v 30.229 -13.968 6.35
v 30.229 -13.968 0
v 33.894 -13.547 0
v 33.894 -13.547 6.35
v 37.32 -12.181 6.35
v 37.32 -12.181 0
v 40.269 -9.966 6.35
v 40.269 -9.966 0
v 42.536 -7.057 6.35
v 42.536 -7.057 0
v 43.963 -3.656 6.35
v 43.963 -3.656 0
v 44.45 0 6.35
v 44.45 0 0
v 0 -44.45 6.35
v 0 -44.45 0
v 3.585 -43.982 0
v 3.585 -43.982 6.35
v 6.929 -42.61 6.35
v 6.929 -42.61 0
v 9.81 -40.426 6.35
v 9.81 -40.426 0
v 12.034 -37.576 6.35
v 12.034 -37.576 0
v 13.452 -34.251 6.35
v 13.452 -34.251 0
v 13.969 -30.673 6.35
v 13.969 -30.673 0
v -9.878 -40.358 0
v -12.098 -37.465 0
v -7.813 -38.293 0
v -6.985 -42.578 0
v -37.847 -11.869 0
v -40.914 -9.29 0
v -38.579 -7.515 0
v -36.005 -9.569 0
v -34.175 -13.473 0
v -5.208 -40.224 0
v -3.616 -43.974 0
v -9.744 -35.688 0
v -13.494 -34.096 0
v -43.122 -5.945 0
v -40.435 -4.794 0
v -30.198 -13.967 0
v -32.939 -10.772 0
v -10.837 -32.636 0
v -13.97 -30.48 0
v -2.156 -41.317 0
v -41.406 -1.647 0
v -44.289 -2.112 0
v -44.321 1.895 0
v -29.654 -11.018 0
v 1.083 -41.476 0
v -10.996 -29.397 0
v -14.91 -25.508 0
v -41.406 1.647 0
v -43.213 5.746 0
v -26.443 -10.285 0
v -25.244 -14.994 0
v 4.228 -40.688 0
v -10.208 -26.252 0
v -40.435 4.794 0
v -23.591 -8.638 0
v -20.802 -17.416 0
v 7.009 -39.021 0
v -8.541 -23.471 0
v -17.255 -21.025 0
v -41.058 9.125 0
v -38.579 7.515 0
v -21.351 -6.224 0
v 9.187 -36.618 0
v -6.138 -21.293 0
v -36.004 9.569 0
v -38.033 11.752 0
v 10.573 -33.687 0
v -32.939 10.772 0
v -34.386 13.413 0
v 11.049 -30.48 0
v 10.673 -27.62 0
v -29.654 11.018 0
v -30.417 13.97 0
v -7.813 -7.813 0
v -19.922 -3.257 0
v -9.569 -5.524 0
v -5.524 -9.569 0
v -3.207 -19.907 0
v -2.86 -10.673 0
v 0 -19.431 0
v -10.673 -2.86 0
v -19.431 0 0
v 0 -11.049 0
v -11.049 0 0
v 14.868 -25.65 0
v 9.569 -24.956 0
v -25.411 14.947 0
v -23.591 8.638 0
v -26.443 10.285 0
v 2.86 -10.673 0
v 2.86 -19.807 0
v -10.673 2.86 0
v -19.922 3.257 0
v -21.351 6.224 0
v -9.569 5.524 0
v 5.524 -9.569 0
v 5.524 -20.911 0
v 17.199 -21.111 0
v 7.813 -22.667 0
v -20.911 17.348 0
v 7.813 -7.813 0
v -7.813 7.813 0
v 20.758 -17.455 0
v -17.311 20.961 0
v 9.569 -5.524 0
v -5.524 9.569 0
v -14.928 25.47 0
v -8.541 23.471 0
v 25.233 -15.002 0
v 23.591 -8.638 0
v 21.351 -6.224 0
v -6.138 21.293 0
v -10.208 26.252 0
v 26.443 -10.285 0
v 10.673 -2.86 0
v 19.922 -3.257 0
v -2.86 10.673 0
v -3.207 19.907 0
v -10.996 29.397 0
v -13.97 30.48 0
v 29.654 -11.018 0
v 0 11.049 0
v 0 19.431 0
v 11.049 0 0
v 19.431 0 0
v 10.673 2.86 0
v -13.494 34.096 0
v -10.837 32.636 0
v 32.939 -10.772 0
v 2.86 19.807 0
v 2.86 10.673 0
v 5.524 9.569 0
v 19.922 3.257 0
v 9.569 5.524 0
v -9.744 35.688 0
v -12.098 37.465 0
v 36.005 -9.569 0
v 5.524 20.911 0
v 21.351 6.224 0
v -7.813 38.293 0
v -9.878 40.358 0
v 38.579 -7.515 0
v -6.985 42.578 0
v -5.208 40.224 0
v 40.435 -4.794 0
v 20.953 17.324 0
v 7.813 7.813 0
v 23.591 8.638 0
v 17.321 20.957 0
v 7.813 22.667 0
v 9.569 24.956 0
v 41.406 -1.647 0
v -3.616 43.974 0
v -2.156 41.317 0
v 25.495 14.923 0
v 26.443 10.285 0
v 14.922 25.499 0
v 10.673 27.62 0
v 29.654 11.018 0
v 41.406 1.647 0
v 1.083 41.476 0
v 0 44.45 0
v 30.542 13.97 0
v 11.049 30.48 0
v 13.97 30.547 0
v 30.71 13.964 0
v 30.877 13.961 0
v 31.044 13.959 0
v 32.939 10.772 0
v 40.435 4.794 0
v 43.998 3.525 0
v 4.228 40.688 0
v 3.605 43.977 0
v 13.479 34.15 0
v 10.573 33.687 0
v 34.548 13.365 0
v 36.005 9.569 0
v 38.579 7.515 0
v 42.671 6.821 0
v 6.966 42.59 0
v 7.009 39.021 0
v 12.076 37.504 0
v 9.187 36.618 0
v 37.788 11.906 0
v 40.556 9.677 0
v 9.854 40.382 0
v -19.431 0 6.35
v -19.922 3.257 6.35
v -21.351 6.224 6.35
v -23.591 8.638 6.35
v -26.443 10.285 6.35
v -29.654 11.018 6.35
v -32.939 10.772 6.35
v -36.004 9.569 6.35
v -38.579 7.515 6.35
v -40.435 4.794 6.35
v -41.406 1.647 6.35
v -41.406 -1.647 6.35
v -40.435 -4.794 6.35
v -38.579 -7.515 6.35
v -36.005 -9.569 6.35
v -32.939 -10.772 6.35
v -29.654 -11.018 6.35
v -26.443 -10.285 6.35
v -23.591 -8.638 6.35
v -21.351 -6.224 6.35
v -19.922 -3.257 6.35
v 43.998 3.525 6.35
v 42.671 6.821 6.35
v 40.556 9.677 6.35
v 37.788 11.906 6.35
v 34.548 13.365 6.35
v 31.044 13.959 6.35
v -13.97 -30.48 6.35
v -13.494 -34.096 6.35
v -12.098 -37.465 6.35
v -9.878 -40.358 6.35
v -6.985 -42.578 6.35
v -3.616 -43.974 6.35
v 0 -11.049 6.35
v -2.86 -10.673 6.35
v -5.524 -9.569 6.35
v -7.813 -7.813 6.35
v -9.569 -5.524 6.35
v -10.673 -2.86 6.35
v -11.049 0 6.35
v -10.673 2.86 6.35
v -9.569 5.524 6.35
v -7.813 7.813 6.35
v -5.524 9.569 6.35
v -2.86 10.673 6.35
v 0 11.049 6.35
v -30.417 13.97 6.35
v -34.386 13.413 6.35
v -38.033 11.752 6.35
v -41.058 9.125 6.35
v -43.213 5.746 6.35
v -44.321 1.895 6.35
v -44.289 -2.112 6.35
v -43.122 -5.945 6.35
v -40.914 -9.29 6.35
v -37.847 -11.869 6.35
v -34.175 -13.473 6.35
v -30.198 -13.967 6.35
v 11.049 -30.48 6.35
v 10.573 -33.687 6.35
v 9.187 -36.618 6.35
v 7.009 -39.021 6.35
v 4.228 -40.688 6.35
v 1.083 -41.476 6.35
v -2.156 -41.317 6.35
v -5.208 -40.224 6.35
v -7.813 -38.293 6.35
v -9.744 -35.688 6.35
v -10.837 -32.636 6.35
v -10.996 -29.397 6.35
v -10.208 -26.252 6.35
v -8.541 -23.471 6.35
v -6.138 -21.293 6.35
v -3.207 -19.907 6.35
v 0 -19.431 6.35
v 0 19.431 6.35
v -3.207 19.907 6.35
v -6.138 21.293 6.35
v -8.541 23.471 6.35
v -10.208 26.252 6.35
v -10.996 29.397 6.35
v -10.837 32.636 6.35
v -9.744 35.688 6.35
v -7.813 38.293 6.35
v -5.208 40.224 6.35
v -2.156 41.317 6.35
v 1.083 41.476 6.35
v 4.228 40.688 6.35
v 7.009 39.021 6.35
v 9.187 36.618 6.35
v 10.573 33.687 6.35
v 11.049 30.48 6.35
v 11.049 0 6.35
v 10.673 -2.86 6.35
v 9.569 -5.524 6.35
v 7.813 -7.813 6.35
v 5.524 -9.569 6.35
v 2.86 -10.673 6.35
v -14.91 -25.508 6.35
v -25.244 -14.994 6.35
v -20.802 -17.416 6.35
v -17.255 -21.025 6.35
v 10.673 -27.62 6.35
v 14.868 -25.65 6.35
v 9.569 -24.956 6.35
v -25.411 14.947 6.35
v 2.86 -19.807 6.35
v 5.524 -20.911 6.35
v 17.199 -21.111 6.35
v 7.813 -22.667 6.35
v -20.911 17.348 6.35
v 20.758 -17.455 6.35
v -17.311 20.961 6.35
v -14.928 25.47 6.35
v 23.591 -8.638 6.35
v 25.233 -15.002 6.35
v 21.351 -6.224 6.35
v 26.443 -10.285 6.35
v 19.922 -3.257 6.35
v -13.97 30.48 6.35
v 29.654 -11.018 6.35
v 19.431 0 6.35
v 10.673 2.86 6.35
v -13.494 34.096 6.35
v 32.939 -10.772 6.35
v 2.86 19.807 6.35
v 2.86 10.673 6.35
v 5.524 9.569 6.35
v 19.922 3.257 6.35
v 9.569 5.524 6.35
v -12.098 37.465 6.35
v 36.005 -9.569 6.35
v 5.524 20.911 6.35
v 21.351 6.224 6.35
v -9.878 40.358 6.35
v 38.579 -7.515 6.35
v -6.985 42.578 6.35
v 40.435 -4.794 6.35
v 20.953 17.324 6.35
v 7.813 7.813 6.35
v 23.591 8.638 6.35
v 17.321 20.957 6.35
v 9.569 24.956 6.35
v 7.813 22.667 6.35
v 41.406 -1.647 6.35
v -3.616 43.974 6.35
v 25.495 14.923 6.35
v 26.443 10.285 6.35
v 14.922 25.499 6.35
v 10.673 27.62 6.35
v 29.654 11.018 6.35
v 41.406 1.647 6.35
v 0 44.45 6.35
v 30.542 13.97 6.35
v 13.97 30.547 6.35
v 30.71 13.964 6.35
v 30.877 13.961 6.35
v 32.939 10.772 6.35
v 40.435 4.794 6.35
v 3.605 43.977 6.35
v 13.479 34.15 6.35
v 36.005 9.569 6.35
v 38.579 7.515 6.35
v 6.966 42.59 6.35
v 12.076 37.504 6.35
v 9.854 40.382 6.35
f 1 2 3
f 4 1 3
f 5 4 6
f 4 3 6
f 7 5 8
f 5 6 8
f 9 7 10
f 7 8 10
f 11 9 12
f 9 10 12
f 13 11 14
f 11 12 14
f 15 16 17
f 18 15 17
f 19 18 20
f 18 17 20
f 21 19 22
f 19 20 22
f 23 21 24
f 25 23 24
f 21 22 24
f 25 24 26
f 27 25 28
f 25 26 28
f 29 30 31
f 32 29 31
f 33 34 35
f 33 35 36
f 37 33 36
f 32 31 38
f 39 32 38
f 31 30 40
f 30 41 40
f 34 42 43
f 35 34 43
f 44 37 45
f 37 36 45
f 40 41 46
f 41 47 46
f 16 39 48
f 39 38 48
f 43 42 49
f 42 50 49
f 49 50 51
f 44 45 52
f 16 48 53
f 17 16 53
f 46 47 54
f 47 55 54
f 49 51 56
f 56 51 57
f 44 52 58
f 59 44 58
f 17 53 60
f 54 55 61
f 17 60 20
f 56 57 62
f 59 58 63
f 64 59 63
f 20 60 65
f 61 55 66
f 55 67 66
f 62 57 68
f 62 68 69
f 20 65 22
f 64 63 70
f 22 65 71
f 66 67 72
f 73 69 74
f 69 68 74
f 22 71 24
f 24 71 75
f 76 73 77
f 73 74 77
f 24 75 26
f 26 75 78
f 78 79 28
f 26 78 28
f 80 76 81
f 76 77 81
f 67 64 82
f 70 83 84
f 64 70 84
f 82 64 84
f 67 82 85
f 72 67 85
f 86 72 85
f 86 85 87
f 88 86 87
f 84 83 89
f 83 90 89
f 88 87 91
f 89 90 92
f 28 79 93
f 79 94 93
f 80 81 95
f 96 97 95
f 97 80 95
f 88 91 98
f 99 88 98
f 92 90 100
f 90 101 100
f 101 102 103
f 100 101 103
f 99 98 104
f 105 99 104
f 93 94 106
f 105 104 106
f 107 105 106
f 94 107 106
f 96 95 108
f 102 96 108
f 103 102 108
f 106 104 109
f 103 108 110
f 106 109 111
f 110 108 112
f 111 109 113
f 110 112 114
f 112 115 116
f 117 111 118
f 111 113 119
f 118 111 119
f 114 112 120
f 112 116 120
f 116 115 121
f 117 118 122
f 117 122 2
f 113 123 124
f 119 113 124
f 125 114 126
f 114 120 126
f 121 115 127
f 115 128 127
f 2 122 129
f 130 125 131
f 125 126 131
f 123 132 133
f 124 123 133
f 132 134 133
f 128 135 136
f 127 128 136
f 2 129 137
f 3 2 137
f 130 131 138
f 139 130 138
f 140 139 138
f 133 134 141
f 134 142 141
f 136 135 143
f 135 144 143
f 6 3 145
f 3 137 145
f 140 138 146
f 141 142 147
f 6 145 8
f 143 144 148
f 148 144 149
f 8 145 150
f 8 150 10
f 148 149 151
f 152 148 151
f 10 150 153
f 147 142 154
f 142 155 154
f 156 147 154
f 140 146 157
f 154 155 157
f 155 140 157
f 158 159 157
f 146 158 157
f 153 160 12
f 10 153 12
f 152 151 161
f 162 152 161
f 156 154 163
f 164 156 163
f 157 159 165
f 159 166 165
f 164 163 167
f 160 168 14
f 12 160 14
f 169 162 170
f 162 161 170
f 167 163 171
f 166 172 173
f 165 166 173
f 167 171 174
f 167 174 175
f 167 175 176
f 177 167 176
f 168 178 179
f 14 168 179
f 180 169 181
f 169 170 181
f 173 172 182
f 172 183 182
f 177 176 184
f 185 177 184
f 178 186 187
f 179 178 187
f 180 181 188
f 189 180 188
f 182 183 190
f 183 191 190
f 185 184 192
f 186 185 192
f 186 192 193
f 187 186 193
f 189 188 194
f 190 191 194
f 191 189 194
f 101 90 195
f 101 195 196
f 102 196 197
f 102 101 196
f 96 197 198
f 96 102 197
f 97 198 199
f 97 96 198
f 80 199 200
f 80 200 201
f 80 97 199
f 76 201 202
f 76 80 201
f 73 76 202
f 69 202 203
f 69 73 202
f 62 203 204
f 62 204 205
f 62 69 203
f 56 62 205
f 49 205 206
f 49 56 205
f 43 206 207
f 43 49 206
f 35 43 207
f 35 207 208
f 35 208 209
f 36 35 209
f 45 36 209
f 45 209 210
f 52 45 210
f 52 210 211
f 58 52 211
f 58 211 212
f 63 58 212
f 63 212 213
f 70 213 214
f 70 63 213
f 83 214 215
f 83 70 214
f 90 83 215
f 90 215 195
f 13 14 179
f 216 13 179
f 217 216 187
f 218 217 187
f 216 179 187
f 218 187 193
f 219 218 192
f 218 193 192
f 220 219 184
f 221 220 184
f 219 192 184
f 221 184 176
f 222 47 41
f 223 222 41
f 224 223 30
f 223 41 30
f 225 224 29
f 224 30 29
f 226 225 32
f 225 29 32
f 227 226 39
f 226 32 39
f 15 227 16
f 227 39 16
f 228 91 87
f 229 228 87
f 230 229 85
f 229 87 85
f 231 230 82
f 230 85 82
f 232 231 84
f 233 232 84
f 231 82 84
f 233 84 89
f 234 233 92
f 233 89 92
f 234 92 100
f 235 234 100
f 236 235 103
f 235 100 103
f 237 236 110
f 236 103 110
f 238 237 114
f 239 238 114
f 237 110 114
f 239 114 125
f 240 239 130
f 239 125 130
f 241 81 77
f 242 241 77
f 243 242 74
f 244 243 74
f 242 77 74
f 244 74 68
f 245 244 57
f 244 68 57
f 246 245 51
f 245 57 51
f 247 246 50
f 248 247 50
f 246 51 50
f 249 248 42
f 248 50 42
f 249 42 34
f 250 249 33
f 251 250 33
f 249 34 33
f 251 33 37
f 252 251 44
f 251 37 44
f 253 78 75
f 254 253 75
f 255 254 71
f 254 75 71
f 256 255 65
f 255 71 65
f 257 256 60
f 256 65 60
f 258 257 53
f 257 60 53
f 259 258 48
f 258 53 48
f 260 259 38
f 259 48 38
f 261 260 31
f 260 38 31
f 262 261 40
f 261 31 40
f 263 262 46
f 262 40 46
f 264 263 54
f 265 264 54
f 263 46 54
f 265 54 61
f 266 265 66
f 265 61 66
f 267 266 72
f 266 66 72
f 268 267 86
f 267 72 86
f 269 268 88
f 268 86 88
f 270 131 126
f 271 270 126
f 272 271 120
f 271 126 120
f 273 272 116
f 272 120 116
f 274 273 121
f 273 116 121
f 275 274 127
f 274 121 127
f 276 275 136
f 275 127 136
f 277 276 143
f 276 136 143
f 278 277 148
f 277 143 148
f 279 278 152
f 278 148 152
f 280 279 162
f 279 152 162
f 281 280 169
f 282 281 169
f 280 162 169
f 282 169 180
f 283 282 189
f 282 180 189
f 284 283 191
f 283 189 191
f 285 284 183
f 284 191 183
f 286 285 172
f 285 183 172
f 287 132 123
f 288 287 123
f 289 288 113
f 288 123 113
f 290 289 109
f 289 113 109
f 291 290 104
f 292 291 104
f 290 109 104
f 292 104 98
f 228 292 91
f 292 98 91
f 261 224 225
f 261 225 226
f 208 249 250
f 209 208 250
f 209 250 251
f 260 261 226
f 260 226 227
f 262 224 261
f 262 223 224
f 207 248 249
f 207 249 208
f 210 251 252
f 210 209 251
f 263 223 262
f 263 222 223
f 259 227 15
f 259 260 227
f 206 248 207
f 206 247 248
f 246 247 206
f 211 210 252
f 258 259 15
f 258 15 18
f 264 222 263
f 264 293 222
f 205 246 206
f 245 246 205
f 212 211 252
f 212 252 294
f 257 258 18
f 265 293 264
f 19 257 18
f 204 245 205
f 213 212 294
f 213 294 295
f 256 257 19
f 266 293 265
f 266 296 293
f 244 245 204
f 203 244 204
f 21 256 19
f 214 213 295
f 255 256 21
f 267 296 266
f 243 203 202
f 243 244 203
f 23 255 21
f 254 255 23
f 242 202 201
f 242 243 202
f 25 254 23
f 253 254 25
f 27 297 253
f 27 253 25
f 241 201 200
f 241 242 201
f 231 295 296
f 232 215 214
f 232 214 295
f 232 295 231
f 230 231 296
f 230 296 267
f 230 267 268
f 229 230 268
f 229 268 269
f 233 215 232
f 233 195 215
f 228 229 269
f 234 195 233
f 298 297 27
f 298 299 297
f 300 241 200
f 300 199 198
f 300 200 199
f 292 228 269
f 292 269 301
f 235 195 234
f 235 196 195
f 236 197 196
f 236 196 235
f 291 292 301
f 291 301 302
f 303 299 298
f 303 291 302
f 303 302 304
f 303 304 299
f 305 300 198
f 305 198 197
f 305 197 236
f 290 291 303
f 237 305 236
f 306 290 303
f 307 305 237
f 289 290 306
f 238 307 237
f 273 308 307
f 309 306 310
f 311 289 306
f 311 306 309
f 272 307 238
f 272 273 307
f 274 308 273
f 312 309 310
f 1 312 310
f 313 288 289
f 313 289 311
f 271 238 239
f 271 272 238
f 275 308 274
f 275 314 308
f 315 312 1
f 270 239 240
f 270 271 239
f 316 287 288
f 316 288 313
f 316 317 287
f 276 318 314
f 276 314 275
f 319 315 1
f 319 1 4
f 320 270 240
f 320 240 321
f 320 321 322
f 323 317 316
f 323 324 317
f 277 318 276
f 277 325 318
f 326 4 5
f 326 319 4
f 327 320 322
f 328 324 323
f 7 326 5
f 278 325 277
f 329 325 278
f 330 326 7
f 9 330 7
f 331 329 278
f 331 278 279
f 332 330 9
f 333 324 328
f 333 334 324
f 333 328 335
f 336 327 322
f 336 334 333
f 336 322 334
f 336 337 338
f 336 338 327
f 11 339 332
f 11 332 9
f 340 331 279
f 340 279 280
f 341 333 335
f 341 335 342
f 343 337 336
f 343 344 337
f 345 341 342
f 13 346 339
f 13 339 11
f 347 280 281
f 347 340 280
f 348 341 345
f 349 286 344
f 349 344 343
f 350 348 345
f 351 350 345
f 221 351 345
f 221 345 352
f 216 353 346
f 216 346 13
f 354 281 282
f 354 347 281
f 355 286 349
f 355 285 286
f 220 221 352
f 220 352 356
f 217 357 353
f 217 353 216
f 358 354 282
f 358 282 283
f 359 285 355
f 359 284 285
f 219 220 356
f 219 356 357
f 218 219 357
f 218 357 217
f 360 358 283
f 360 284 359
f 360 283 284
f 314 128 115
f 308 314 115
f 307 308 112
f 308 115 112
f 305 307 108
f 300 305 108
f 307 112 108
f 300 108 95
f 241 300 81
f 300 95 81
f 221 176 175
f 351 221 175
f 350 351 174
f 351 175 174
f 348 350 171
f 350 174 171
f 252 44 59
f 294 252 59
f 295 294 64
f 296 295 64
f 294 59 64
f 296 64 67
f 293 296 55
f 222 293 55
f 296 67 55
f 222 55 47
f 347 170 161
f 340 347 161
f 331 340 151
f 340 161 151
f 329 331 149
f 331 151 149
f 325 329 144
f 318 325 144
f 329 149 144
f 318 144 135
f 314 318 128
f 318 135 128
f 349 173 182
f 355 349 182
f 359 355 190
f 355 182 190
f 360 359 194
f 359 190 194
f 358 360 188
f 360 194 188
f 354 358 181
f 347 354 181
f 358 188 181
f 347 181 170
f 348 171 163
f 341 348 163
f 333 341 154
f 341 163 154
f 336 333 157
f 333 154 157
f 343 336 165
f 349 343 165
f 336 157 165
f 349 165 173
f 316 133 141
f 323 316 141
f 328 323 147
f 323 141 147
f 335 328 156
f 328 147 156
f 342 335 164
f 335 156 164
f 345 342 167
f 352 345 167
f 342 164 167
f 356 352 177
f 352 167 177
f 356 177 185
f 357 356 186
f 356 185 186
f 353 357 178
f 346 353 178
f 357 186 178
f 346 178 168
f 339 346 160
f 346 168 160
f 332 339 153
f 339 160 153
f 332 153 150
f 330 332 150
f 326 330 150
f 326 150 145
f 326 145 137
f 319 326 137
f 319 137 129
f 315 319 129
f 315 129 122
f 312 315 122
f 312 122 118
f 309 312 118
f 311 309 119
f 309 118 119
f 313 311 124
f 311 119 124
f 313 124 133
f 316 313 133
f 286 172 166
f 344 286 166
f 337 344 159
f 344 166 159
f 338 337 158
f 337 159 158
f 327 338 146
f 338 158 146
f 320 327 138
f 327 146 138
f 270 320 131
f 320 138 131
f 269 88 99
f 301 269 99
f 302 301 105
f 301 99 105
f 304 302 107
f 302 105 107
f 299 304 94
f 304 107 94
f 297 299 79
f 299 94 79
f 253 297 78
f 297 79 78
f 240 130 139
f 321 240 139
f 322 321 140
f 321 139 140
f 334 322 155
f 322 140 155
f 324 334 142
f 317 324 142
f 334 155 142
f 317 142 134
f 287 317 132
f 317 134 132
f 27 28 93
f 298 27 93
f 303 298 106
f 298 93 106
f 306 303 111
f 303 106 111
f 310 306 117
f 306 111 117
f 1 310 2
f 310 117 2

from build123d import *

# Parameters (mm, degrees)
F0_R     = 11.049
F1_DEPTH = 6.35


with BuildPart() as f1:
    # F0 (on Top) → F1 (new body)
    with BuildSketch(Plane.XY):
        with BuildLine():
            ThreePointArc((30.5423546194, 13.9698608404), (19.000422111, 19.0038325132), (13.9698381707, 30.547241977))
            ThreePointArc((13.9698381707, 30.547241977), (13.9699595426, 30.5136210859), (13.97, 30.48))
            ThreePointArc((13.97, 30.48), (9.8782817373, 20.6017182709), (1.15e-08, 16.51))
            ThreePointArc((1.15e-08, 16.51), (11.6743329615, 11.6743329533), (16.51, 0))
            ThreePointArc((16.51, 0), (20.623788609, 9.900302875), (30.5423546194, 13.9698608404))
        make_face()
        with BuildLine():
            ThreePointArc((1.15e-08, 16.51), (-9.8782817291, 20.6017182627), (-13.97, 30.48))
            ThreePointArc((-13.97, 30.48), (-18.9768088864, 19.0202694582), (-30.4173910664, 13.969859703))
            ThreePointArc((-30.4173910664, 13.969859703), (-20.5796074118, 9.8561212756), (-16.51, 0))
            ThreePointArc((-16.51, 0), (-11.6743329533, 11.6743329615), (1.15e-08, 16.51))
        make_face()
        with BuildLine():
            ThreePointArc((-30.4173910664, 13.969859703), (-40.3361211962, 9.9003926673), (-44.45, 2.241e-07))
            ThreePointArc((-44.45, 2.241e-07), (-40.2581741683, -9.9773849246), (-30.1982875449, -13.9671592707))
            ThreePointArc((-30.1982875449, -13.9671592707), (-20.5026149969, -9.7781740883), (-16.51, 0))
            ThreePointArc((-16.51, 0), (-20.5796074118, 9.8561212756), (-30.4173910664, 13.969859703))
        make_face()
        with Locations((-30.48, 0)):
            Circle(F0_R, mode=Mode.SUBTRACT)
        with BuildLine():
            ThreePointArc((-30.1982875449, -13.9671592707), (-18.895154623, -19.0895439026), (-13.97, -30.48))
            ThreePointArc((-13.97, -30.48), (-9.8782817214, -20.6017182551), (3.33e-08, -16.51))
            ThreePointArc((3.33e-08, -16.51), (-11.6743329456, -11.6743329692), (-16.51, 0))
            ThreePointArc((-16.51, 0), (-20.5026149969, -9.7781740883), (-30.1982875449, -13.9671592707))
        make_face()
        with BuildLine():
            ThreePointArc((13.9686715274, -30.6726545055), (18.8427220321, -19.1504715121), (30.2294023882, -13.9677521755))
            ThreePointArc((30.2294023882, -13.9677521755), (20.5135124382, -9.7892811626), (16.51, 0))
            ThreePointArc((16.51, 0), (11.6743329692, -11.6743329456), (3.33e-08, -16.51))
            ThreePointArc((3.33e-08, -16.51), (9.8782817449, -20.6017182786), (13.97, -30.48))
            ThreePointArc((13.97, -30.48), (13.9696678779, -30.5763295429), (13.9686715274, -30.6726545055))
        make_face()
        with BuildLine():
            ThreePointArc((3.33e-08, -16.51), (11.6743329692, -11.6743329456), (16.51, 0))
            Line((16.51, 0), (11.049, 0))
            ThreePointArc((11.049, 0), (7.8128228253, -7.8128228253), (0, -11.049))
            Line((0, -11.049), (0, -16.51))
        make_face()
        with BuildLine():
            Line((11.049, 0), (16.51, 0))
            ThreePointArc((16.51, 0), (11.6743329615, 11.6743329533), (1.15e-08, 16.51))
            Line((0, 16.51), (0, 11.049))
            ThreePointArc((0, 11.049), (7.8128228253, 7.8128228253), (11.049, 0))
        make_face()
        with BuildLine():
            Line((0, 11.049), (0, 16.51))
            ThreePointArc((1.15e-08, 16.51), (-11.6743329533, 11.6743329615), (-16.51, 0))
            Line((-16.51, 0), (-11.049, 0))
            ThreePointArc((-11.049, 0), (-7.8128228253, 7.8128228253), (0, 11.049))
        make_face()
        with BuildLine():
            ThreePointArc((-16.51, 0), (-11.6743329456, -11.6743329692), (3.33e-08, -16.51))
            Line((0, -16.51), (0, -11.049))
            ThreePointArc((0, -11.049), (-7.8128228253, -7.8128228253), (-11.049, 0))
            Line((-11.049, 0), (-16.51, 0))
        make_face()
        with BuildLine():
            ThreePointArc((-13.97, -30.48), (-9.8782816496, -40.3582818168), (2.364e-07, -44.45))
            ThreePointArc((2.364e-07, -44.45), (9.8099316986, -40.4261620774), (13.9686715274, -30.6726545055))
            ThreePointArc((13.9686715274, -30.6726545055), (13.9696678779, -30.5763295429), (13.97, -30.48))
            ThreePointArc((13.97, -30.48), (9.8782817449, -20.6017182786), (3.33e-08, -16.51))
            ThreePointArc((3.33e-08, -16.51), (-9.8782817214, -20.6017182551), (-13.97, -30.48))
        make_face()
        with BuildLine():
            ThreePointArc((11.049, -30.48), (-7.8128228253, -38.2928228253), (0, -19.431))
            ThreePointArc((0, -19.431), (7.8128228253, -22.6671771747), (11.049, -30.48))
        make_face(mode=Mode.SUBTRACT)
        with BuildLine():
            ThreePointArc((30.2294023882, -13.9677521755), (40.2692811626, -9.9664875618), (44.45, 0))
            ThreePointArc((44.45, 0), (40.5557673489, 9.6767666258), (31.0441571466, 13.9586040389))
            ThreePointArc((31.0441571466, 13.9586040389), (30.7932148695, 13.9624041517), (30.5423546194, 13.9698608404))
            ThreePointArc((30.5423546194, 13.9698608404), (20.623788609, 9.900302875), (16.51, 0))
            ThreePointArc((16.51, 0), (20.5135124382, -9.7892811626), (30.2294023882, -13.9677521755))
        make_face()
        with BuildLine():
            ThreePointArc((41.529, 0), (30.48, -11.049), (19.431, 0))
            ThreePointArc((19.431, 0), (30.48, 11.049), (41.529, 0))
        make_face(mode=Mode.SUBTRACT)
        with BuildLine():
            ThreePointArc((13.9698381707, 30.547241977), (9.8544794632, 40.382026788), (1.001e-07, 44.45))
            ThreePointArc((1.001e-07, 44.45), (-9.8782816978, 40.3582817686), (-13.97, 30.48))
            ThreePointArc((-13.97, 30.48), (-9.8782817291, 20.6017182627), (1.15e-08, 16.51))
            ThreePointArc((1.15e-08, 16.51), (9.8782817373, 20.6017182709), (13.97, 30.48))
            ThreePointArc((13.97, 30.48), (13.9699595426, 30.5136210859), (13.9698381707, 30.547241977))
        make_face()
        with BuildLine():
            ThreePointArc((11.049, 30.48), (7.8128228253, 22.6671771747), (0, 19.431))
            ThreePointArc((0, 19.431), (-7.8128228253, 38.2928228253), (11.049, 30.48))
        make_face(mode=Mode.SUBTRACT)
    extrude(amount=F1_DEPTH)


solid = f1.part
